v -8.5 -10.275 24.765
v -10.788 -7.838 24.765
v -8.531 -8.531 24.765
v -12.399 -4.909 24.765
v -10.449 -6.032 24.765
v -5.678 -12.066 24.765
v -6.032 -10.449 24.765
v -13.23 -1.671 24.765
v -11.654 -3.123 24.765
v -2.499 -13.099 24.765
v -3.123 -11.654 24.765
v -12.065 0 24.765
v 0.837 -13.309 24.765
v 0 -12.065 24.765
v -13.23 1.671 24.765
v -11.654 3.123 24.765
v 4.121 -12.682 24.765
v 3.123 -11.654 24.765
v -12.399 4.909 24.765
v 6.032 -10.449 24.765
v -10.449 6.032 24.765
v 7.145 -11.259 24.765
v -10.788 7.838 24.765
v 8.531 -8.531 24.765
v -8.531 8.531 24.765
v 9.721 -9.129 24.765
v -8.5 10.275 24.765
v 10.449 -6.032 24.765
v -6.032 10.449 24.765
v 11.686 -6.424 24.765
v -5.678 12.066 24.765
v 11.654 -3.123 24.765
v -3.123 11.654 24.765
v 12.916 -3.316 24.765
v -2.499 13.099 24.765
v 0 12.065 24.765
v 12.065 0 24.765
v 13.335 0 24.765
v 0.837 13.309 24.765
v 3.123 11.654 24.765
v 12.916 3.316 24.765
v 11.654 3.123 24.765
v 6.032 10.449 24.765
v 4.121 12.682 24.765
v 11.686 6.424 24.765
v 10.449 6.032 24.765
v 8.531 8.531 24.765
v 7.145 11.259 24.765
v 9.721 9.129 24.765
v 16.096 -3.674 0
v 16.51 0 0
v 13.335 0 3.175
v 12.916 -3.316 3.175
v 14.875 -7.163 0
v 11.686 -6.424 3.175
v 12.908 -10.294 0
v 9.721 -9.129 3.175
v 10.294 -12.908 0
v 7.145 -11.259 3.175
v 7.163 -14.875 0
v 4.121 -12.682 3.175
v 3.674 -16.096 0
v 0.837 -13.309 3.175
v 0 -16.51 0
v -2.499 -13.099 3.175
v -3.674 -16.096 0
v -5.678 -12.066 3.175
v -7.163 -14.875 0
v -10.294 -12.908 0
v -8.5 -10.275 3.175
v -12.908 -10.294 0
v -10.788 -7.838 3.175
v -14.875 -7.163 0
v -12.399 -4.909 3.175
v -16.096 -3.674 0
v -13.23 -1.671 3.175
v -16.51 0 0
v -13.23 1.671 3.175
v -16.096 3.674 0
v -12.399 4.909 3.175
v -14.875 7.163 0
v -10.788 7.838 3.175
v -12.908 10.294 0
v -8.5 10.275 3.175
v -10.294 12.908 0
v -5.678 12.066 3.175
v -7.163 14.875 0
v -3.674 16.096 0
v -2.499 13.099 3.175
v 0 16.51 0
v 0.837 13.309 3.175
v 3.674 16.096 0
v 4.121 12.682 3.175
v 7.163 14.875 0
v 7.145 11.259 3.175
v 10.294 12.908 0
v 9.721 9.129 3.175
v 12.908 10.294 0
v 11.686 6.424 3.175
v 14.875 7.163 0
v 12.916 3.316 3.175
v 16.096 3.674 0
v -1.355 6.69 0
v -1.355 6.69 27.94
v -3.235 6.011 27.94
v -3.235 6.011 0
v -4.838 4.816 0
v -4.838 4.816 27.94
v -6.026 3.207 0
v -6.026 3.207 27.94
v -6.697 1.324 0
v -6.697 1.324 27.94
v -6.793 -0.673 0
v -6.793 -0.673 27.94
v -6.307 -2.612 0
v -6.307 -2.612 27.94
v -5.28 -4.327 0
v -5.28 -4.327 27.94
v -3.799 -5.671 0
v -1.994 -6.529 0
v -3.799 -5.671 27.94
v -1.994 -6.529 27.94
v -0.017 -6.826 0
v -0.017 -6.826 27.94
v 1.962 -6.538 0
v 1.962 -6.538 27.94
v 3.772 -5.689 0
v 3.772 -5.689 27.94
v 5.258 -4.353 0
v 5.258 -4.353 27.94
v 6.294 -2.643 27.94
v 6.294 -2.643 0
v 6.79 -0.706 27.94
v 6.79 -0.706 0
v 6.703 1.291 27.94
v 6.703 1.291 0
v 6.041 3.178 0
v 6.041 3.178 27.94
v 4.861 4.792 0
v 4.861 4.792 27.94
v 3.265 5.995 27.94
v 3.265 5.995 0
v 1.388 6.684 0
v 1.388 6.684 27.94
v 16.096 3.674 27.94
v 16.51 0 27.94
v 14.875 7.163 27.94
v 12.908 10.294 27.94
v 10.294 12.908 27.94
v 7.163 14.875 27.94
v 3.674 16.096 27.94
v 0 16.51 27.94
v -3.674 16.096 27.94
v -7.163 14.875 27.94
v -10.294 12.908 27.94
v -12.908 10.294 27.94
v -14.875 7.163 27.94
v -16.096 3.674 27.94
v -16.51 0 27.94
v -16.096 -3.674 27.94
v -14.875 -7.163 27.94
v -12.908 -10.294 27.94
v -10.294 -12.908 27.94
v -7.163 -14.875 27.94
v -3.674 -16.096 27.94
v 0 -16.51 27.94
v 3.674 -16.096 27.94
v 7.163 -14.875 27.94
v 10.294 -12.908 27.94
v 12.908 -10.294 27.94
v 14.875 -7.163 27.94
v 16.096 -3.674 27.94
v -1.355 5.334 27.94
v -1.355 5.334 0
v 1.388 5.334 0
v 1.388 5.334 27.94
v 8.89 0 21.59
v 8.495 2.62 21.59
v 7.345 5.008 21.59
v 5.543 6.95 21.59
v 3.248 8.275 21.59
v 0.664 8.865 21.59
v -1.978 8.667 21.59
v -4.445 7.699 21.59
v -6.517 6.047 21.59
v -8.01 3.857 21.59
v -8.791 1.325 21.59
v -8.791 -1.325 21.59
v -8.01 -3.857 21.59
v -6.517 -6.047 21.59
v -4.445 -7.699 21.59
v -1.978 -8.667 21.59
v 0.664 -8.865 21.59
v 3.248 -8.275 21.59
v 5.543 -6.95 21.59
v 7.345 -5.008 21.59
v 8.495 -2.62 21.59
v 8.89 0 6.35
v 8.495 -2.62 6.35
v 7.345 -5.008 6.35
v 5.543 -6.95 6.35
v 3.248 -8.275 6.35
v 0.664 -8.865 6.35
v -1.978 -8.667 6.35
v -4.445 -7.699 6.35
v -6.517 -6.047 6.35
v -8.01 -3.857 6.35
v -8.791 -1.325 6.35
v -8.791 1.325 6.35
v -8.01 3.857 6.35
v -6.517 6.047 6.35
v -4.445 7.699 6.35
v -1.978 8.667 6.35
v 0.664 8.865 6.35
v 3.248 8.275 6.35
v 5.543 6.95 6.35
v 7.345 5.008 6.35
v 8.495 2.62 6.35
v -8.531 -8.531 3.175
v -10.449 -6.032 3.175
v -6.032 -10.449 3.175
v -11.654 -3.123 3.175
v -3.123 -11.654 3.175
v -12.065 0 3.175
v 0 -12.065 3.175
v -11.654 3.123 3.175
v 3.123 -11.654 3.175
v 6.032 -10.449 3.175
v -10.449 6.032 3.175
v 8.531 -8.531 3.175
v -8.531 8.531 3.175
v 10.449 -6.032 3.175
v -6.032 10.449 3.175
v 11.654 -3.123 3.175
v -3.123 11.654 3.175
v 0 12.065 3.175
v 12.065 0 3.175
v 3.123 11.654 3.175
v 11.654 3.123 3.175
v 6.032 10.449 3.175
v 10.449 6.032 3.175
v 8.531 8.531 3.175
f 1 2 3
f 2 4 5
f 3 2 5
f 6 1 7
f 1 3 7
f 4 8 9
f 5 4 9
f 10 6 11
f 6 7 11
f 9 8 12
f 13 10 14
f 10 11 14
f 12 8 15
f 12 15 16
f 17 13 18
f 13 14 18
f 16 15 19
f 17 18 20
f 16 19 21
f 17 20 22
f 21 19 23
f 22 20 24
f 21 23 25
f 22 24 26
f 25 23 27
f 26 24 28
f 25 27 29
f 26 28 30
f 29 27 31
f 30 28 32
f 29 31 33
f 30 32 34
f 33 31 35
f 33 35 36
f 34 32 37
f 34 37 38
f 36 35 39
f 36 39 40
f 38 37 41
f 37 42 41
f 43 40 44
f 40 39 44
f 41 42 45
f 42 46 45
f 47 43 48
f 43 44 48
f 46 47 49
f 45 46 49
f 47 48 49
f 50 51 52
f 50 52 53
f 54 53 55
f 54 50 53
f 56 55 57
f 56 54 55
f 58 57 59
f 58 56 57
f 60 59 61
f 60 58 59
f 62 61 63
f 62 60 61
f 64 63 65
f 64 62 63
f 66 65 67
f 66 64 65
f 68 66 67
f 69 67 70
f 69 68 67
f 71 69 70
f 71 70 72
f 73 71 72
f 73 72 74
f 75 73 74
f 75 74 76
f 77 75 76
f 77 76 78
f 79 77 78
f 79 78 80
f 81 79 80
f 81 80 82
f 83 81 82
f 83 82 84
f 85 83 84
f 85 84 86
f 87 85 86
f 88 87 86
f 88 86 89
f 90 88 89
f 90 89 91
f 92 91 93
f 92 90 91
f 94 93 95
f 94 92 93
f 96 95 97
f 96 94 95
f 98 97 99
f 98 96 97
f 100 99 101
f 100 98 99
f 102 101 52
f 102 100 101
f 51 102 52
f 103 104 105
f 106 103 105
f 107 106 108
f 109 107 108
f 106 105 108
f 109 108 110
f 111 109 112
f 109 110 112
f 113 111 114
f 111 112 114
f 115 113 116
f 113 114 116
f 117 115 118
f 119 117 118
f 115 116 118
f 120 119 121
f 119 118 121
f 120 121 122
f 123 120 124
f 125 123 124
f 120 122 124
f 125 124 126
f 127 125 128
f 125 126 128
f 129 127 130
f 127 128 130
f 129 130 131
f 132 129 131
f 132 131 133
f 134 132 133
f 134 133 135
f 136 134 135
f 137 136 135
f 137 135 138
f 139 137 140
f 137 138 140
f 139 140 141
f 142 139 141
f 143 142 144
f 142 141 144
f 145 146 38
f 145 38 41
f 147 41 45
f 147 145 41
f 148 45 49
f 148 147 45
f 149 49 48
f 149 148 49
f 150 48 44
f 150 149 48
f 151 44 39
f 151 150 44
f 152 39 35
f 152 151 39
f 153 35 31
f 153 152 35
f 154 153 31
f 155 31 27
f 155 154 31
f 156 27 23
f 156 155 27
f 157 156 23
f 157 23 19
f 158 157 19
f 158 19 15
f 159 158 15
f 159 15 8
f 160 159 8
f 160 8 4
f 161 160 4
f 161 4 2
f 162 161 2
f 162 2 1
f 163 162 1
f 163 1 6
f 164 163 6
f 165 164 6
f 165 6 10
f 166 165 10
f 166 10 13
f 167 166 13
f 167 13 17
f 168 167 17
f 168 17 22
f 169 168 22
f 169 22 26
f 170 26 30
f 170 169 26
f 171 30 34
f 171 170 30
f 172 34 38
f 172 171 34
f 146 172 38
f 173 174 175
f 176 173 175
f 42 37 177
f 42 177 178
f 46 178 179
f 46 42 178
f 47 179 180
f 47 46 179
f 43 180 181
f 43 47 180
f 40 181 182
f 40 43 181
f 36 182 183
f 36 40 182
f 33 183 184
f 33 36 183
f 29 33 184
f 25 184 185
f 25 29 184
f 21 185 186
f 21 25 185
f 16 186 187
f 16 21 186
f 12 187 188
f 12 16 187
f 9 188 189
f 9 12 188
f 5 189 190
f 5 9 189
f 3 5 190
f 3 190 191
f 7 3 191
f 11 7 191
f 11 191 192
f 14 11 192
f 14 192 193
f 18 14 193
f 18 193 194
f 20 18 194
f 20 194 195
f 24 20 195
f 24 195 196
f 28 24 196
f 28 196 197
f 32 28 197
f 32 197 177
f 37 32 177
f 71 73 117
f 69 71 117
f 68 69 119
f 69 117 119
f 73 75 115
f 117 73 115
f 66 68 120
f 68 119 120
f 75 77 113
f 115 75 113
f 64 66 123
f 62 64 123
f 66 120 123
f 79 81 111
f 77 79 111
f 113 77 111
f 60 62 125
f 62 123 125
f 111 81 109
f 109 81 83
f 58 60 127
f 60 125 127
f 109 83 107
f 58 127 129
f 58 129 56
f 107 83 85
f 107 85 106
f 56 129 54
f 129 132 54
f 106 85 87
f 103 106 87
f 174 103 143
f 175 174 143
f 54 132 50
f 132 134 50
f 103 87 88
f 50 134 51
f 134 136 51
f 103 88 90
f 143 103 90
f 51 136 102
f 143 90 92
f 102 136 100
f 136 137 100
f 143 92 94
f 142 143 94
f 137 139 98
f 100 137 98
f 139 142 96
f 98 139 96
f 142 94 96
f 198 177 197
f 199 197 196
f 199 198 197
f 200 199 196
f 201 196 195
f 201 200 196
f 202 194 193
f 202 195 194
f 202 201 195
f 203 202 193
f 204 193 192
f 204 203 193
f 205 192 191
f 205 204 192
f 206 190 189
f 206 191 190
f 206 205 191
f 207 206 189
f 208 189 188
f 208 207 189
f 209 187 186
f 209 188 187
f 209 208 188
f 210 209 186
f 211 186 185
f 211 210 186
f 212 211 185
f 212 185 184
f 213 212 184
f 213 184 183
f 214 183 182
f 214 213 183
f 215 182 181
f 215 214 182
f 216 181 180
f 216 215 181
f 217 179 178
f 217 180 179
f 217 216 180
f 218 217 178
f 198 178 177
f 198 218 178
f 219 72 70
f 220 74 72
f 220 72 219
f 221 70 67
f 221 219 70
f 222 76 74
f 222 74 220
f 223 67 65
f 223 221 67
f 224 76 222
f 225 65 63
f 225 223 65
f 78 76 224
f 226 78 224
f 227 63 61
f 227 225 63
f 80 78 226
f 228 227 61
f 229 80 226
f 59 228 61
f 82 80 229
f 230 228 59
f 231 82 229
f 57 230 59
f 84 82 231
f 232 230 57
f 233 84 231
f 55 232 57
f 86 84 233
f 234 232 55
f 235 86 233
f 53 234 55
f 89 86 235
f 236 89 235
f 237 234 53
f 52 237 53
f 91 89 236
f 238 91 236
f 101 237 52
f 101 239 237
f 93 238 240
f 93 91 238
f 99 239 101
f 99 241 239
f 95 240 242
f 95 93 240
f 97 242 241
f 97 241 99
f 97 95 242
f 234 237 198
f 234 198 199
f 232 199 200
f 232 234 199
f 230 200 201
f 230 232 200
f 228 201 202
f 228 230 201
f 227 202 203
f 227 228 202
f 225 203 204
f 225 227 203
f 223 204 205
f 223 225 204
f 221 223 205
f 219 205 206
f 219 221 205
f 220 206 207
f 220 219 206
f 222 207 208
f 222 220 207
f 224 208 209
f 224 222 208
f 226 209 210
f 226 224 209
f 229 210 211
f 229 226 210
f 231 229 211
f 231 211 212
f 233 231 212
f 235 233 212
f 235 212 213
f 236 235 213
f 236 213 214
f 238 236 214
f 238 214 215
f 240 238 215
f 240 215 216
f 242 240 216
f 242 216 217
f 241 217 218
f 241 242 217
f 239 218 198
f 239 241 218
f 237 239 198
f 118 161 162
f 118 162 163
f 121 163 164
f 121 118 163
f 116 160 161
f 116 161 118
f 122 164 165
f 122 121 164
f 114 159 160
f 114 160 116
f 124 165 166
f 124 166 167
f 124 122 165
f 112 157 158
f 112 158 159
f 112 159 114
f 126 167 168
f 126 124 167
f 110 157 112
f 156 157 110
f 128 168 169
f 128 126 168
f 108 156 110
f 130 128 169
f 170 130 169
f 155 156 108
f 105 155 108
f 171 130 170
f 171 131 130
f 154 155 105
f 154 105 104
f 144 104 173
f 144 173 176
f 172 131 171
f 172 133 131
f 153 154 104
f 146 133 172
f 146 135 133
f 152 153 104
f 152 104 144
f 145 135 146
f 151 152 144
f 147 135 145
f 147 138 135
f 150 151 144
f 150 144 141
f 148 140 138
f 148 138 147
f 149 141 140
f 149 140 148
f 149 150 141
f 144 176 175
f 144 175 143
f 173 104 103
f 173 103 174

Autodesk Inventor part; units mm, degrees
ref_plane "YZ Plane" through (0, 0, 0) normal (1, 0, 0) x (0, 1, 0)
ref_plane "XZ Plane" through (0, 0, 0) normal (0, 1, 0) x (-1, 0, 0)
ref_plane "XY Plane" through (0, 0, 0) normal (0, 0, 1) x (1, 0, 0)
sketch "Sketch1" plane through (0, 0, 0) normal (0, 0, 1) x (1, 0, 0)
  circle A0 centre (0, 0) radius 6.604
  circle A1 centre (0, 0) radius 16.51
  dimension "d0" = 13.208
  dimension "d1" = 33.02
extrude "Extrusion1" add sketch "Sketch1" along normal blind 6.35
sketch "Sketch2" plane through (0, 0, 6.35) normal (0, 0, 1) x (1, 0, 0)
  circle A0 centre (0, 0) radius 6.604
  circle A1 centre (0, 0) radius 12.7
  dimension "d4" = 25.4
extrude "Extrusion2" add sketch "Sketch2" along normal blind 15.24
sketch "Sketch3" plane through (0, 0, 21.59) normal (0, 0, 1) x (1, 0, 0)
  circle A0 centre (0, 0) radius 12.7
  circle A1 centre (0, 0) radius 16.51
  circle A2 centre (0, 0) radius 6.604
  dimension "d7" = 25.4
  dimension "d8" = 33.02
  dimension "d9" = 13.208
extrude "Extrusion3" add sketch "Sketch3" along normal blind 6.35 contours A0 | A1
sketch "Sketch4" plane through (0, 0, 27.94) normal (0, 0, 1) x (1, 0, 0)
  circle A0 centre (0, 0) radius 6.604 projected
  line L0 (1.3879, 6.604) -> (-1.3553, 6.604)
  line L1 (-1.3553, 6.604) -> (-1.3553, 5.334)
  line L2 (-1.3553, 5.334) -> (1.3879, 5.334)
  line L3 (1.3879, 5.334) -> (1.3879, 6.604)
  point P0 (-2.9121, 5.9273)
  point P1 (-1.3626, 6.604)
  dimension "d12" = 2.7432
  dimension "d13" = 1.27
extrude "Extrusion4" add sketch "Sketch4" against normal blind 27.94 contours L3 L2 L1 A0 | A0 L0 L3 | L1 L0 A0 picked at (0.0109, 5.7573)
sketch "Sketch5" plane through (0, 0, 21.59) normal (0, 0, -1) x (-1, 0, 0)
  arc A0 (-1.3879, 6.4565) -> (1.3553, 6.4634) centre (0, 0) ccw projected
  circle A1 centre (0, 0) radius 12.7
  circle A2 centre (0, 0) radius 16.1987
  circle A3 centre (0, 0) radius 16.51
  dimension "d16" = 33.02
extrude "Extrusion5" cut sketch "Sketch5" against normal blind 3.175 contours A2 | A3
sketch "Sketch6" plane through (0, 0, 6.35) normal (0, 0, 1) x (1, 0, 0)
  circle A0 centre (0, 0) radius 12.7
  circle A1 centre (0, 0) radius 16.51
  dimension "d19" = 25.4
  dimension "d20" = 33.02
extrude "Extrusion6" cut sketch "Sketch6" against normal blind 3.175
sketch "Sketch7" plane through (0, 0, 3.175) normal (0, 0, 1) x (1, 0, 0)
  circle A0 centre (0, 0) radius 8.89
  circle A1 centre (0, 0) radius 12.7
  dimension "d23" = 17.78
  dimension "d24" = 25.4
extrude "Extrusion7" cut sketch "Sketch7" along normal blind 21.59
chamfer "Chamfer1" distance 3.175 angle 45 4 edges at (-8.89, 0, 3.175) (-16.51, 0, 3.175) (-8.89, 0, 24.765) (-16.51, 0, 24.765)
sketch "Sketch8" plane through (0, 0, 27.94) normal (0, 0, 1) x (1, 0, 0)
  circle A0 centre (0, 0) radius 6.8262
  line L0 (-1.3553, 5.334) -> (-1.3553, 6.4634) projected
  line L1 (-1.3553, 6.6903) -> (-1.3553, 5.334)
  line L2 (1.3879, 6.4565) -> (1.3879, 5.334) projected
  line L3 (-1.3553, 5.334) -> (1.3879, 5.334)
  line L4 (1.3879, 5.334) -> (1.3879, 6.6837)
  dimension "d30" = 13.6525
extrude "Extrusion8" cut sketch "Sketch8" against normal blind 50.8 contours A0 L1 L0 L3 L2 L4 picked at (-0.1975, 1.2902)
properties part number "spool"
